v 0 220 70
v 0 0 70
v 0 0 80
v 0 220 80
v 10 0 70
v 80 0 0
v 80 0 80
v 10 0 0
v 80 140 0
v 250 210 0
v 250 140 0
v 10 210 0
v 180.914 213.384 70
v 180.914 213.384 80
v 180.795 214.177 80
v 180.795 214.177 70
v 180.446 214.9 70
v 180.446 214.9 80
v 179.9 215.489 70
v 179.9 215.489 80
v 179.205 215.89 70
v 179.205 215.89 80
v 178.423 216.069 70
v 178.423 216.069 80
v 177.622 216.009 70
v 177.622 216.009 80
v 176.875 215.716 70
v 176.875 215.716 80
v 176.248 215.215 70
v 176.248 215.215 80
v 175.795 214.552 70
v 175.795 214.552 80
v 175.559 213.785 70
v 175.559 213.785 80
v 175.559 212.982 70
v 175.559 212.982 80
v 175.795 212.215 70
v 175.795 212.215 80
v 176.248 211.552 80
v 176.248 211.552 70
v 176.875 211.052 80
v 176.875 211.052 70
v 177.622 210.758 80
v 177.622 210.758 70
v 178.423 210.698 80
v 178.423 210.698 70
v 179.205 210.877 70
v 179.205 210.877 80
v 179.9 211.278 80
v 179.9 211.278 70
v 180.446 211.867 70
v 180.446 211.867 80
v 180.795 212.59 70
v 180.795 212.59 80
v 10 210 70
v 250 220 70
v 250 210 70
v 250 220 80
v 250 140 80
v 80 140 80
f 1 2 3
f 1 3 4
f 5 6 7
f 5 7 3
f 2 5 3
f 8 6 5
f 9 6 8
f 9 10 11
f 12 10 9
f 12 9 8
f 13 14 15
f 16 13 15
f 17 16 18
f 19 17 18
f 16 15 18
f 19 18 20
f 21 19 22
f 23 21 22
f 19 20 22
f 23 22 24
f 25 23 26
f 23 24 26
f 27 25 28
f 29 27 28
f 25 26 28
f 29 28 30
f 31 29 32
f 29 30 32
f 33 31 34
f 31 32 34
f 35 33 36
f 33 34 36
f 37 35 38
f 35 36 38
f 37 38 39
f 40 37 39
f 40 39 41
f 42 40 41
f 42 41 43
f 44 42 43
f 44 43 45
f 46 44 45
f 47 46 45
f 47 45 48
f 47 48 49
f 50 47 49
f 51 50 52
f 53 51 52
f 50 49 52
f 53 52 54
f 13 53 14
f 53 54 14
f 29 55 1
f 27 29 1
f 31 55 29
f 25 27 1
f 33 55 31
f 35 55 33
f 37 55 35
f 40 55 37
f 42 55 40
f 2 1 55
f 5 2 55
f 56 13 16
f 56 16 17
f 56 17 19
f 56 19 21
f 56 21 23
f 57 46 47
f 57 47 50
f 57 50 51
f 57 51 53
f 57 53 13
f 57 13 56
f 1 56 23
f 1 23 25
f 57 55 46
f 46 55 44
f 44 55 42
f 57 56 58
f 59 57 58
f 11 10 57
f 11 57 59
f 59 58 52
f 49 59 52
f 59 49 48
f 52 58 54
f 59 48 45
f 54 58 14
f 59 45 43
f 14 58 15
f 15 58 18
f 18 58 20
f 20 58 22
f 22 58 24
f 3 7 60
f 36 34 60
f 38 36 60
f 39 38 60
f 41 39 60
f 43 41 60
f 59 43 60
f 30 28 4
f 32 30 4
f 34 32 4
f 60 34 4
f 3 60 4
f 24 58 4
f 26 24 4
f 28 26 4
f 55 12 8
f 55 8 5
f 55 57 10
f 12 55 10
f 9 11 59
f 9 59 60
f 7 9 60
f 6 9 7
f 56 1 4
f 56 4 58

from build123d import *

# Parameters (mm, degrees)
EXTRUDE_1_DEPTH     = 80
SKETCH_2_W          = 10
SKETCH_2_H          = 70
CUT_EXTRUDE_1_DEPTH = 250
SKETCH_3_W          = 70
SKETCH_3_H          = 10
CUT_EXTRUDE_2_DEPTH = 250
SKETCH_4_R          = 2.692710991
CUT_EXTRUDE_3_DEPTH = 10


with BuildPart() as part:
    # Эскиз1 → Бобышка-Вытянуть1 (new body)
    with BuildSketch(Plane.XY):
        Polygon((0, 0), (0, 220), (250, 220), (250, 140), (80, 140), (80, 0), align=None)
    extrude(amount=EXTRUDE_1_DEPTH)

    # Эскиз2 → Вырез-Вытянуть1 (cut)
    with BuildSketch(Plane.XZ):
        with Locations((5, 35)):
            Rectangle(SKETCH_2_W, SKETCH_2_H)
    extrude(amount=-CUT_EXTRUDE_1_DEPTH, mode=Mode.SUBTRACT)

    # Эскиз3 → Вырез-Вытянуть2 (cut)
    with BuildSketch(Plane(origin=(250, 0, 0), x_dir=(0, 0, -1), z_dir=(1, 0, 0))):
        with Locations((-35, 215)):
            Rectangle(SKETCH_3_W, SKETCH_3_H)
    extrude(amount=-CUT_EXTRUDE_2_DEPTH, mode=Mode.SUBTRACT)

    # Эскиз4 → Вырез-Вытянуть3 (cut)
    with BuildSketch(Plane.XY.offset(80)):
        with Locations((178.22144368, 213.38359115)):
            Circle(SKETCH_4_R)
    extrude(amount=-CUT_EXTRUDE_3_DEPTH, mode=Mode.SUBTRACT)


solid = part.part
